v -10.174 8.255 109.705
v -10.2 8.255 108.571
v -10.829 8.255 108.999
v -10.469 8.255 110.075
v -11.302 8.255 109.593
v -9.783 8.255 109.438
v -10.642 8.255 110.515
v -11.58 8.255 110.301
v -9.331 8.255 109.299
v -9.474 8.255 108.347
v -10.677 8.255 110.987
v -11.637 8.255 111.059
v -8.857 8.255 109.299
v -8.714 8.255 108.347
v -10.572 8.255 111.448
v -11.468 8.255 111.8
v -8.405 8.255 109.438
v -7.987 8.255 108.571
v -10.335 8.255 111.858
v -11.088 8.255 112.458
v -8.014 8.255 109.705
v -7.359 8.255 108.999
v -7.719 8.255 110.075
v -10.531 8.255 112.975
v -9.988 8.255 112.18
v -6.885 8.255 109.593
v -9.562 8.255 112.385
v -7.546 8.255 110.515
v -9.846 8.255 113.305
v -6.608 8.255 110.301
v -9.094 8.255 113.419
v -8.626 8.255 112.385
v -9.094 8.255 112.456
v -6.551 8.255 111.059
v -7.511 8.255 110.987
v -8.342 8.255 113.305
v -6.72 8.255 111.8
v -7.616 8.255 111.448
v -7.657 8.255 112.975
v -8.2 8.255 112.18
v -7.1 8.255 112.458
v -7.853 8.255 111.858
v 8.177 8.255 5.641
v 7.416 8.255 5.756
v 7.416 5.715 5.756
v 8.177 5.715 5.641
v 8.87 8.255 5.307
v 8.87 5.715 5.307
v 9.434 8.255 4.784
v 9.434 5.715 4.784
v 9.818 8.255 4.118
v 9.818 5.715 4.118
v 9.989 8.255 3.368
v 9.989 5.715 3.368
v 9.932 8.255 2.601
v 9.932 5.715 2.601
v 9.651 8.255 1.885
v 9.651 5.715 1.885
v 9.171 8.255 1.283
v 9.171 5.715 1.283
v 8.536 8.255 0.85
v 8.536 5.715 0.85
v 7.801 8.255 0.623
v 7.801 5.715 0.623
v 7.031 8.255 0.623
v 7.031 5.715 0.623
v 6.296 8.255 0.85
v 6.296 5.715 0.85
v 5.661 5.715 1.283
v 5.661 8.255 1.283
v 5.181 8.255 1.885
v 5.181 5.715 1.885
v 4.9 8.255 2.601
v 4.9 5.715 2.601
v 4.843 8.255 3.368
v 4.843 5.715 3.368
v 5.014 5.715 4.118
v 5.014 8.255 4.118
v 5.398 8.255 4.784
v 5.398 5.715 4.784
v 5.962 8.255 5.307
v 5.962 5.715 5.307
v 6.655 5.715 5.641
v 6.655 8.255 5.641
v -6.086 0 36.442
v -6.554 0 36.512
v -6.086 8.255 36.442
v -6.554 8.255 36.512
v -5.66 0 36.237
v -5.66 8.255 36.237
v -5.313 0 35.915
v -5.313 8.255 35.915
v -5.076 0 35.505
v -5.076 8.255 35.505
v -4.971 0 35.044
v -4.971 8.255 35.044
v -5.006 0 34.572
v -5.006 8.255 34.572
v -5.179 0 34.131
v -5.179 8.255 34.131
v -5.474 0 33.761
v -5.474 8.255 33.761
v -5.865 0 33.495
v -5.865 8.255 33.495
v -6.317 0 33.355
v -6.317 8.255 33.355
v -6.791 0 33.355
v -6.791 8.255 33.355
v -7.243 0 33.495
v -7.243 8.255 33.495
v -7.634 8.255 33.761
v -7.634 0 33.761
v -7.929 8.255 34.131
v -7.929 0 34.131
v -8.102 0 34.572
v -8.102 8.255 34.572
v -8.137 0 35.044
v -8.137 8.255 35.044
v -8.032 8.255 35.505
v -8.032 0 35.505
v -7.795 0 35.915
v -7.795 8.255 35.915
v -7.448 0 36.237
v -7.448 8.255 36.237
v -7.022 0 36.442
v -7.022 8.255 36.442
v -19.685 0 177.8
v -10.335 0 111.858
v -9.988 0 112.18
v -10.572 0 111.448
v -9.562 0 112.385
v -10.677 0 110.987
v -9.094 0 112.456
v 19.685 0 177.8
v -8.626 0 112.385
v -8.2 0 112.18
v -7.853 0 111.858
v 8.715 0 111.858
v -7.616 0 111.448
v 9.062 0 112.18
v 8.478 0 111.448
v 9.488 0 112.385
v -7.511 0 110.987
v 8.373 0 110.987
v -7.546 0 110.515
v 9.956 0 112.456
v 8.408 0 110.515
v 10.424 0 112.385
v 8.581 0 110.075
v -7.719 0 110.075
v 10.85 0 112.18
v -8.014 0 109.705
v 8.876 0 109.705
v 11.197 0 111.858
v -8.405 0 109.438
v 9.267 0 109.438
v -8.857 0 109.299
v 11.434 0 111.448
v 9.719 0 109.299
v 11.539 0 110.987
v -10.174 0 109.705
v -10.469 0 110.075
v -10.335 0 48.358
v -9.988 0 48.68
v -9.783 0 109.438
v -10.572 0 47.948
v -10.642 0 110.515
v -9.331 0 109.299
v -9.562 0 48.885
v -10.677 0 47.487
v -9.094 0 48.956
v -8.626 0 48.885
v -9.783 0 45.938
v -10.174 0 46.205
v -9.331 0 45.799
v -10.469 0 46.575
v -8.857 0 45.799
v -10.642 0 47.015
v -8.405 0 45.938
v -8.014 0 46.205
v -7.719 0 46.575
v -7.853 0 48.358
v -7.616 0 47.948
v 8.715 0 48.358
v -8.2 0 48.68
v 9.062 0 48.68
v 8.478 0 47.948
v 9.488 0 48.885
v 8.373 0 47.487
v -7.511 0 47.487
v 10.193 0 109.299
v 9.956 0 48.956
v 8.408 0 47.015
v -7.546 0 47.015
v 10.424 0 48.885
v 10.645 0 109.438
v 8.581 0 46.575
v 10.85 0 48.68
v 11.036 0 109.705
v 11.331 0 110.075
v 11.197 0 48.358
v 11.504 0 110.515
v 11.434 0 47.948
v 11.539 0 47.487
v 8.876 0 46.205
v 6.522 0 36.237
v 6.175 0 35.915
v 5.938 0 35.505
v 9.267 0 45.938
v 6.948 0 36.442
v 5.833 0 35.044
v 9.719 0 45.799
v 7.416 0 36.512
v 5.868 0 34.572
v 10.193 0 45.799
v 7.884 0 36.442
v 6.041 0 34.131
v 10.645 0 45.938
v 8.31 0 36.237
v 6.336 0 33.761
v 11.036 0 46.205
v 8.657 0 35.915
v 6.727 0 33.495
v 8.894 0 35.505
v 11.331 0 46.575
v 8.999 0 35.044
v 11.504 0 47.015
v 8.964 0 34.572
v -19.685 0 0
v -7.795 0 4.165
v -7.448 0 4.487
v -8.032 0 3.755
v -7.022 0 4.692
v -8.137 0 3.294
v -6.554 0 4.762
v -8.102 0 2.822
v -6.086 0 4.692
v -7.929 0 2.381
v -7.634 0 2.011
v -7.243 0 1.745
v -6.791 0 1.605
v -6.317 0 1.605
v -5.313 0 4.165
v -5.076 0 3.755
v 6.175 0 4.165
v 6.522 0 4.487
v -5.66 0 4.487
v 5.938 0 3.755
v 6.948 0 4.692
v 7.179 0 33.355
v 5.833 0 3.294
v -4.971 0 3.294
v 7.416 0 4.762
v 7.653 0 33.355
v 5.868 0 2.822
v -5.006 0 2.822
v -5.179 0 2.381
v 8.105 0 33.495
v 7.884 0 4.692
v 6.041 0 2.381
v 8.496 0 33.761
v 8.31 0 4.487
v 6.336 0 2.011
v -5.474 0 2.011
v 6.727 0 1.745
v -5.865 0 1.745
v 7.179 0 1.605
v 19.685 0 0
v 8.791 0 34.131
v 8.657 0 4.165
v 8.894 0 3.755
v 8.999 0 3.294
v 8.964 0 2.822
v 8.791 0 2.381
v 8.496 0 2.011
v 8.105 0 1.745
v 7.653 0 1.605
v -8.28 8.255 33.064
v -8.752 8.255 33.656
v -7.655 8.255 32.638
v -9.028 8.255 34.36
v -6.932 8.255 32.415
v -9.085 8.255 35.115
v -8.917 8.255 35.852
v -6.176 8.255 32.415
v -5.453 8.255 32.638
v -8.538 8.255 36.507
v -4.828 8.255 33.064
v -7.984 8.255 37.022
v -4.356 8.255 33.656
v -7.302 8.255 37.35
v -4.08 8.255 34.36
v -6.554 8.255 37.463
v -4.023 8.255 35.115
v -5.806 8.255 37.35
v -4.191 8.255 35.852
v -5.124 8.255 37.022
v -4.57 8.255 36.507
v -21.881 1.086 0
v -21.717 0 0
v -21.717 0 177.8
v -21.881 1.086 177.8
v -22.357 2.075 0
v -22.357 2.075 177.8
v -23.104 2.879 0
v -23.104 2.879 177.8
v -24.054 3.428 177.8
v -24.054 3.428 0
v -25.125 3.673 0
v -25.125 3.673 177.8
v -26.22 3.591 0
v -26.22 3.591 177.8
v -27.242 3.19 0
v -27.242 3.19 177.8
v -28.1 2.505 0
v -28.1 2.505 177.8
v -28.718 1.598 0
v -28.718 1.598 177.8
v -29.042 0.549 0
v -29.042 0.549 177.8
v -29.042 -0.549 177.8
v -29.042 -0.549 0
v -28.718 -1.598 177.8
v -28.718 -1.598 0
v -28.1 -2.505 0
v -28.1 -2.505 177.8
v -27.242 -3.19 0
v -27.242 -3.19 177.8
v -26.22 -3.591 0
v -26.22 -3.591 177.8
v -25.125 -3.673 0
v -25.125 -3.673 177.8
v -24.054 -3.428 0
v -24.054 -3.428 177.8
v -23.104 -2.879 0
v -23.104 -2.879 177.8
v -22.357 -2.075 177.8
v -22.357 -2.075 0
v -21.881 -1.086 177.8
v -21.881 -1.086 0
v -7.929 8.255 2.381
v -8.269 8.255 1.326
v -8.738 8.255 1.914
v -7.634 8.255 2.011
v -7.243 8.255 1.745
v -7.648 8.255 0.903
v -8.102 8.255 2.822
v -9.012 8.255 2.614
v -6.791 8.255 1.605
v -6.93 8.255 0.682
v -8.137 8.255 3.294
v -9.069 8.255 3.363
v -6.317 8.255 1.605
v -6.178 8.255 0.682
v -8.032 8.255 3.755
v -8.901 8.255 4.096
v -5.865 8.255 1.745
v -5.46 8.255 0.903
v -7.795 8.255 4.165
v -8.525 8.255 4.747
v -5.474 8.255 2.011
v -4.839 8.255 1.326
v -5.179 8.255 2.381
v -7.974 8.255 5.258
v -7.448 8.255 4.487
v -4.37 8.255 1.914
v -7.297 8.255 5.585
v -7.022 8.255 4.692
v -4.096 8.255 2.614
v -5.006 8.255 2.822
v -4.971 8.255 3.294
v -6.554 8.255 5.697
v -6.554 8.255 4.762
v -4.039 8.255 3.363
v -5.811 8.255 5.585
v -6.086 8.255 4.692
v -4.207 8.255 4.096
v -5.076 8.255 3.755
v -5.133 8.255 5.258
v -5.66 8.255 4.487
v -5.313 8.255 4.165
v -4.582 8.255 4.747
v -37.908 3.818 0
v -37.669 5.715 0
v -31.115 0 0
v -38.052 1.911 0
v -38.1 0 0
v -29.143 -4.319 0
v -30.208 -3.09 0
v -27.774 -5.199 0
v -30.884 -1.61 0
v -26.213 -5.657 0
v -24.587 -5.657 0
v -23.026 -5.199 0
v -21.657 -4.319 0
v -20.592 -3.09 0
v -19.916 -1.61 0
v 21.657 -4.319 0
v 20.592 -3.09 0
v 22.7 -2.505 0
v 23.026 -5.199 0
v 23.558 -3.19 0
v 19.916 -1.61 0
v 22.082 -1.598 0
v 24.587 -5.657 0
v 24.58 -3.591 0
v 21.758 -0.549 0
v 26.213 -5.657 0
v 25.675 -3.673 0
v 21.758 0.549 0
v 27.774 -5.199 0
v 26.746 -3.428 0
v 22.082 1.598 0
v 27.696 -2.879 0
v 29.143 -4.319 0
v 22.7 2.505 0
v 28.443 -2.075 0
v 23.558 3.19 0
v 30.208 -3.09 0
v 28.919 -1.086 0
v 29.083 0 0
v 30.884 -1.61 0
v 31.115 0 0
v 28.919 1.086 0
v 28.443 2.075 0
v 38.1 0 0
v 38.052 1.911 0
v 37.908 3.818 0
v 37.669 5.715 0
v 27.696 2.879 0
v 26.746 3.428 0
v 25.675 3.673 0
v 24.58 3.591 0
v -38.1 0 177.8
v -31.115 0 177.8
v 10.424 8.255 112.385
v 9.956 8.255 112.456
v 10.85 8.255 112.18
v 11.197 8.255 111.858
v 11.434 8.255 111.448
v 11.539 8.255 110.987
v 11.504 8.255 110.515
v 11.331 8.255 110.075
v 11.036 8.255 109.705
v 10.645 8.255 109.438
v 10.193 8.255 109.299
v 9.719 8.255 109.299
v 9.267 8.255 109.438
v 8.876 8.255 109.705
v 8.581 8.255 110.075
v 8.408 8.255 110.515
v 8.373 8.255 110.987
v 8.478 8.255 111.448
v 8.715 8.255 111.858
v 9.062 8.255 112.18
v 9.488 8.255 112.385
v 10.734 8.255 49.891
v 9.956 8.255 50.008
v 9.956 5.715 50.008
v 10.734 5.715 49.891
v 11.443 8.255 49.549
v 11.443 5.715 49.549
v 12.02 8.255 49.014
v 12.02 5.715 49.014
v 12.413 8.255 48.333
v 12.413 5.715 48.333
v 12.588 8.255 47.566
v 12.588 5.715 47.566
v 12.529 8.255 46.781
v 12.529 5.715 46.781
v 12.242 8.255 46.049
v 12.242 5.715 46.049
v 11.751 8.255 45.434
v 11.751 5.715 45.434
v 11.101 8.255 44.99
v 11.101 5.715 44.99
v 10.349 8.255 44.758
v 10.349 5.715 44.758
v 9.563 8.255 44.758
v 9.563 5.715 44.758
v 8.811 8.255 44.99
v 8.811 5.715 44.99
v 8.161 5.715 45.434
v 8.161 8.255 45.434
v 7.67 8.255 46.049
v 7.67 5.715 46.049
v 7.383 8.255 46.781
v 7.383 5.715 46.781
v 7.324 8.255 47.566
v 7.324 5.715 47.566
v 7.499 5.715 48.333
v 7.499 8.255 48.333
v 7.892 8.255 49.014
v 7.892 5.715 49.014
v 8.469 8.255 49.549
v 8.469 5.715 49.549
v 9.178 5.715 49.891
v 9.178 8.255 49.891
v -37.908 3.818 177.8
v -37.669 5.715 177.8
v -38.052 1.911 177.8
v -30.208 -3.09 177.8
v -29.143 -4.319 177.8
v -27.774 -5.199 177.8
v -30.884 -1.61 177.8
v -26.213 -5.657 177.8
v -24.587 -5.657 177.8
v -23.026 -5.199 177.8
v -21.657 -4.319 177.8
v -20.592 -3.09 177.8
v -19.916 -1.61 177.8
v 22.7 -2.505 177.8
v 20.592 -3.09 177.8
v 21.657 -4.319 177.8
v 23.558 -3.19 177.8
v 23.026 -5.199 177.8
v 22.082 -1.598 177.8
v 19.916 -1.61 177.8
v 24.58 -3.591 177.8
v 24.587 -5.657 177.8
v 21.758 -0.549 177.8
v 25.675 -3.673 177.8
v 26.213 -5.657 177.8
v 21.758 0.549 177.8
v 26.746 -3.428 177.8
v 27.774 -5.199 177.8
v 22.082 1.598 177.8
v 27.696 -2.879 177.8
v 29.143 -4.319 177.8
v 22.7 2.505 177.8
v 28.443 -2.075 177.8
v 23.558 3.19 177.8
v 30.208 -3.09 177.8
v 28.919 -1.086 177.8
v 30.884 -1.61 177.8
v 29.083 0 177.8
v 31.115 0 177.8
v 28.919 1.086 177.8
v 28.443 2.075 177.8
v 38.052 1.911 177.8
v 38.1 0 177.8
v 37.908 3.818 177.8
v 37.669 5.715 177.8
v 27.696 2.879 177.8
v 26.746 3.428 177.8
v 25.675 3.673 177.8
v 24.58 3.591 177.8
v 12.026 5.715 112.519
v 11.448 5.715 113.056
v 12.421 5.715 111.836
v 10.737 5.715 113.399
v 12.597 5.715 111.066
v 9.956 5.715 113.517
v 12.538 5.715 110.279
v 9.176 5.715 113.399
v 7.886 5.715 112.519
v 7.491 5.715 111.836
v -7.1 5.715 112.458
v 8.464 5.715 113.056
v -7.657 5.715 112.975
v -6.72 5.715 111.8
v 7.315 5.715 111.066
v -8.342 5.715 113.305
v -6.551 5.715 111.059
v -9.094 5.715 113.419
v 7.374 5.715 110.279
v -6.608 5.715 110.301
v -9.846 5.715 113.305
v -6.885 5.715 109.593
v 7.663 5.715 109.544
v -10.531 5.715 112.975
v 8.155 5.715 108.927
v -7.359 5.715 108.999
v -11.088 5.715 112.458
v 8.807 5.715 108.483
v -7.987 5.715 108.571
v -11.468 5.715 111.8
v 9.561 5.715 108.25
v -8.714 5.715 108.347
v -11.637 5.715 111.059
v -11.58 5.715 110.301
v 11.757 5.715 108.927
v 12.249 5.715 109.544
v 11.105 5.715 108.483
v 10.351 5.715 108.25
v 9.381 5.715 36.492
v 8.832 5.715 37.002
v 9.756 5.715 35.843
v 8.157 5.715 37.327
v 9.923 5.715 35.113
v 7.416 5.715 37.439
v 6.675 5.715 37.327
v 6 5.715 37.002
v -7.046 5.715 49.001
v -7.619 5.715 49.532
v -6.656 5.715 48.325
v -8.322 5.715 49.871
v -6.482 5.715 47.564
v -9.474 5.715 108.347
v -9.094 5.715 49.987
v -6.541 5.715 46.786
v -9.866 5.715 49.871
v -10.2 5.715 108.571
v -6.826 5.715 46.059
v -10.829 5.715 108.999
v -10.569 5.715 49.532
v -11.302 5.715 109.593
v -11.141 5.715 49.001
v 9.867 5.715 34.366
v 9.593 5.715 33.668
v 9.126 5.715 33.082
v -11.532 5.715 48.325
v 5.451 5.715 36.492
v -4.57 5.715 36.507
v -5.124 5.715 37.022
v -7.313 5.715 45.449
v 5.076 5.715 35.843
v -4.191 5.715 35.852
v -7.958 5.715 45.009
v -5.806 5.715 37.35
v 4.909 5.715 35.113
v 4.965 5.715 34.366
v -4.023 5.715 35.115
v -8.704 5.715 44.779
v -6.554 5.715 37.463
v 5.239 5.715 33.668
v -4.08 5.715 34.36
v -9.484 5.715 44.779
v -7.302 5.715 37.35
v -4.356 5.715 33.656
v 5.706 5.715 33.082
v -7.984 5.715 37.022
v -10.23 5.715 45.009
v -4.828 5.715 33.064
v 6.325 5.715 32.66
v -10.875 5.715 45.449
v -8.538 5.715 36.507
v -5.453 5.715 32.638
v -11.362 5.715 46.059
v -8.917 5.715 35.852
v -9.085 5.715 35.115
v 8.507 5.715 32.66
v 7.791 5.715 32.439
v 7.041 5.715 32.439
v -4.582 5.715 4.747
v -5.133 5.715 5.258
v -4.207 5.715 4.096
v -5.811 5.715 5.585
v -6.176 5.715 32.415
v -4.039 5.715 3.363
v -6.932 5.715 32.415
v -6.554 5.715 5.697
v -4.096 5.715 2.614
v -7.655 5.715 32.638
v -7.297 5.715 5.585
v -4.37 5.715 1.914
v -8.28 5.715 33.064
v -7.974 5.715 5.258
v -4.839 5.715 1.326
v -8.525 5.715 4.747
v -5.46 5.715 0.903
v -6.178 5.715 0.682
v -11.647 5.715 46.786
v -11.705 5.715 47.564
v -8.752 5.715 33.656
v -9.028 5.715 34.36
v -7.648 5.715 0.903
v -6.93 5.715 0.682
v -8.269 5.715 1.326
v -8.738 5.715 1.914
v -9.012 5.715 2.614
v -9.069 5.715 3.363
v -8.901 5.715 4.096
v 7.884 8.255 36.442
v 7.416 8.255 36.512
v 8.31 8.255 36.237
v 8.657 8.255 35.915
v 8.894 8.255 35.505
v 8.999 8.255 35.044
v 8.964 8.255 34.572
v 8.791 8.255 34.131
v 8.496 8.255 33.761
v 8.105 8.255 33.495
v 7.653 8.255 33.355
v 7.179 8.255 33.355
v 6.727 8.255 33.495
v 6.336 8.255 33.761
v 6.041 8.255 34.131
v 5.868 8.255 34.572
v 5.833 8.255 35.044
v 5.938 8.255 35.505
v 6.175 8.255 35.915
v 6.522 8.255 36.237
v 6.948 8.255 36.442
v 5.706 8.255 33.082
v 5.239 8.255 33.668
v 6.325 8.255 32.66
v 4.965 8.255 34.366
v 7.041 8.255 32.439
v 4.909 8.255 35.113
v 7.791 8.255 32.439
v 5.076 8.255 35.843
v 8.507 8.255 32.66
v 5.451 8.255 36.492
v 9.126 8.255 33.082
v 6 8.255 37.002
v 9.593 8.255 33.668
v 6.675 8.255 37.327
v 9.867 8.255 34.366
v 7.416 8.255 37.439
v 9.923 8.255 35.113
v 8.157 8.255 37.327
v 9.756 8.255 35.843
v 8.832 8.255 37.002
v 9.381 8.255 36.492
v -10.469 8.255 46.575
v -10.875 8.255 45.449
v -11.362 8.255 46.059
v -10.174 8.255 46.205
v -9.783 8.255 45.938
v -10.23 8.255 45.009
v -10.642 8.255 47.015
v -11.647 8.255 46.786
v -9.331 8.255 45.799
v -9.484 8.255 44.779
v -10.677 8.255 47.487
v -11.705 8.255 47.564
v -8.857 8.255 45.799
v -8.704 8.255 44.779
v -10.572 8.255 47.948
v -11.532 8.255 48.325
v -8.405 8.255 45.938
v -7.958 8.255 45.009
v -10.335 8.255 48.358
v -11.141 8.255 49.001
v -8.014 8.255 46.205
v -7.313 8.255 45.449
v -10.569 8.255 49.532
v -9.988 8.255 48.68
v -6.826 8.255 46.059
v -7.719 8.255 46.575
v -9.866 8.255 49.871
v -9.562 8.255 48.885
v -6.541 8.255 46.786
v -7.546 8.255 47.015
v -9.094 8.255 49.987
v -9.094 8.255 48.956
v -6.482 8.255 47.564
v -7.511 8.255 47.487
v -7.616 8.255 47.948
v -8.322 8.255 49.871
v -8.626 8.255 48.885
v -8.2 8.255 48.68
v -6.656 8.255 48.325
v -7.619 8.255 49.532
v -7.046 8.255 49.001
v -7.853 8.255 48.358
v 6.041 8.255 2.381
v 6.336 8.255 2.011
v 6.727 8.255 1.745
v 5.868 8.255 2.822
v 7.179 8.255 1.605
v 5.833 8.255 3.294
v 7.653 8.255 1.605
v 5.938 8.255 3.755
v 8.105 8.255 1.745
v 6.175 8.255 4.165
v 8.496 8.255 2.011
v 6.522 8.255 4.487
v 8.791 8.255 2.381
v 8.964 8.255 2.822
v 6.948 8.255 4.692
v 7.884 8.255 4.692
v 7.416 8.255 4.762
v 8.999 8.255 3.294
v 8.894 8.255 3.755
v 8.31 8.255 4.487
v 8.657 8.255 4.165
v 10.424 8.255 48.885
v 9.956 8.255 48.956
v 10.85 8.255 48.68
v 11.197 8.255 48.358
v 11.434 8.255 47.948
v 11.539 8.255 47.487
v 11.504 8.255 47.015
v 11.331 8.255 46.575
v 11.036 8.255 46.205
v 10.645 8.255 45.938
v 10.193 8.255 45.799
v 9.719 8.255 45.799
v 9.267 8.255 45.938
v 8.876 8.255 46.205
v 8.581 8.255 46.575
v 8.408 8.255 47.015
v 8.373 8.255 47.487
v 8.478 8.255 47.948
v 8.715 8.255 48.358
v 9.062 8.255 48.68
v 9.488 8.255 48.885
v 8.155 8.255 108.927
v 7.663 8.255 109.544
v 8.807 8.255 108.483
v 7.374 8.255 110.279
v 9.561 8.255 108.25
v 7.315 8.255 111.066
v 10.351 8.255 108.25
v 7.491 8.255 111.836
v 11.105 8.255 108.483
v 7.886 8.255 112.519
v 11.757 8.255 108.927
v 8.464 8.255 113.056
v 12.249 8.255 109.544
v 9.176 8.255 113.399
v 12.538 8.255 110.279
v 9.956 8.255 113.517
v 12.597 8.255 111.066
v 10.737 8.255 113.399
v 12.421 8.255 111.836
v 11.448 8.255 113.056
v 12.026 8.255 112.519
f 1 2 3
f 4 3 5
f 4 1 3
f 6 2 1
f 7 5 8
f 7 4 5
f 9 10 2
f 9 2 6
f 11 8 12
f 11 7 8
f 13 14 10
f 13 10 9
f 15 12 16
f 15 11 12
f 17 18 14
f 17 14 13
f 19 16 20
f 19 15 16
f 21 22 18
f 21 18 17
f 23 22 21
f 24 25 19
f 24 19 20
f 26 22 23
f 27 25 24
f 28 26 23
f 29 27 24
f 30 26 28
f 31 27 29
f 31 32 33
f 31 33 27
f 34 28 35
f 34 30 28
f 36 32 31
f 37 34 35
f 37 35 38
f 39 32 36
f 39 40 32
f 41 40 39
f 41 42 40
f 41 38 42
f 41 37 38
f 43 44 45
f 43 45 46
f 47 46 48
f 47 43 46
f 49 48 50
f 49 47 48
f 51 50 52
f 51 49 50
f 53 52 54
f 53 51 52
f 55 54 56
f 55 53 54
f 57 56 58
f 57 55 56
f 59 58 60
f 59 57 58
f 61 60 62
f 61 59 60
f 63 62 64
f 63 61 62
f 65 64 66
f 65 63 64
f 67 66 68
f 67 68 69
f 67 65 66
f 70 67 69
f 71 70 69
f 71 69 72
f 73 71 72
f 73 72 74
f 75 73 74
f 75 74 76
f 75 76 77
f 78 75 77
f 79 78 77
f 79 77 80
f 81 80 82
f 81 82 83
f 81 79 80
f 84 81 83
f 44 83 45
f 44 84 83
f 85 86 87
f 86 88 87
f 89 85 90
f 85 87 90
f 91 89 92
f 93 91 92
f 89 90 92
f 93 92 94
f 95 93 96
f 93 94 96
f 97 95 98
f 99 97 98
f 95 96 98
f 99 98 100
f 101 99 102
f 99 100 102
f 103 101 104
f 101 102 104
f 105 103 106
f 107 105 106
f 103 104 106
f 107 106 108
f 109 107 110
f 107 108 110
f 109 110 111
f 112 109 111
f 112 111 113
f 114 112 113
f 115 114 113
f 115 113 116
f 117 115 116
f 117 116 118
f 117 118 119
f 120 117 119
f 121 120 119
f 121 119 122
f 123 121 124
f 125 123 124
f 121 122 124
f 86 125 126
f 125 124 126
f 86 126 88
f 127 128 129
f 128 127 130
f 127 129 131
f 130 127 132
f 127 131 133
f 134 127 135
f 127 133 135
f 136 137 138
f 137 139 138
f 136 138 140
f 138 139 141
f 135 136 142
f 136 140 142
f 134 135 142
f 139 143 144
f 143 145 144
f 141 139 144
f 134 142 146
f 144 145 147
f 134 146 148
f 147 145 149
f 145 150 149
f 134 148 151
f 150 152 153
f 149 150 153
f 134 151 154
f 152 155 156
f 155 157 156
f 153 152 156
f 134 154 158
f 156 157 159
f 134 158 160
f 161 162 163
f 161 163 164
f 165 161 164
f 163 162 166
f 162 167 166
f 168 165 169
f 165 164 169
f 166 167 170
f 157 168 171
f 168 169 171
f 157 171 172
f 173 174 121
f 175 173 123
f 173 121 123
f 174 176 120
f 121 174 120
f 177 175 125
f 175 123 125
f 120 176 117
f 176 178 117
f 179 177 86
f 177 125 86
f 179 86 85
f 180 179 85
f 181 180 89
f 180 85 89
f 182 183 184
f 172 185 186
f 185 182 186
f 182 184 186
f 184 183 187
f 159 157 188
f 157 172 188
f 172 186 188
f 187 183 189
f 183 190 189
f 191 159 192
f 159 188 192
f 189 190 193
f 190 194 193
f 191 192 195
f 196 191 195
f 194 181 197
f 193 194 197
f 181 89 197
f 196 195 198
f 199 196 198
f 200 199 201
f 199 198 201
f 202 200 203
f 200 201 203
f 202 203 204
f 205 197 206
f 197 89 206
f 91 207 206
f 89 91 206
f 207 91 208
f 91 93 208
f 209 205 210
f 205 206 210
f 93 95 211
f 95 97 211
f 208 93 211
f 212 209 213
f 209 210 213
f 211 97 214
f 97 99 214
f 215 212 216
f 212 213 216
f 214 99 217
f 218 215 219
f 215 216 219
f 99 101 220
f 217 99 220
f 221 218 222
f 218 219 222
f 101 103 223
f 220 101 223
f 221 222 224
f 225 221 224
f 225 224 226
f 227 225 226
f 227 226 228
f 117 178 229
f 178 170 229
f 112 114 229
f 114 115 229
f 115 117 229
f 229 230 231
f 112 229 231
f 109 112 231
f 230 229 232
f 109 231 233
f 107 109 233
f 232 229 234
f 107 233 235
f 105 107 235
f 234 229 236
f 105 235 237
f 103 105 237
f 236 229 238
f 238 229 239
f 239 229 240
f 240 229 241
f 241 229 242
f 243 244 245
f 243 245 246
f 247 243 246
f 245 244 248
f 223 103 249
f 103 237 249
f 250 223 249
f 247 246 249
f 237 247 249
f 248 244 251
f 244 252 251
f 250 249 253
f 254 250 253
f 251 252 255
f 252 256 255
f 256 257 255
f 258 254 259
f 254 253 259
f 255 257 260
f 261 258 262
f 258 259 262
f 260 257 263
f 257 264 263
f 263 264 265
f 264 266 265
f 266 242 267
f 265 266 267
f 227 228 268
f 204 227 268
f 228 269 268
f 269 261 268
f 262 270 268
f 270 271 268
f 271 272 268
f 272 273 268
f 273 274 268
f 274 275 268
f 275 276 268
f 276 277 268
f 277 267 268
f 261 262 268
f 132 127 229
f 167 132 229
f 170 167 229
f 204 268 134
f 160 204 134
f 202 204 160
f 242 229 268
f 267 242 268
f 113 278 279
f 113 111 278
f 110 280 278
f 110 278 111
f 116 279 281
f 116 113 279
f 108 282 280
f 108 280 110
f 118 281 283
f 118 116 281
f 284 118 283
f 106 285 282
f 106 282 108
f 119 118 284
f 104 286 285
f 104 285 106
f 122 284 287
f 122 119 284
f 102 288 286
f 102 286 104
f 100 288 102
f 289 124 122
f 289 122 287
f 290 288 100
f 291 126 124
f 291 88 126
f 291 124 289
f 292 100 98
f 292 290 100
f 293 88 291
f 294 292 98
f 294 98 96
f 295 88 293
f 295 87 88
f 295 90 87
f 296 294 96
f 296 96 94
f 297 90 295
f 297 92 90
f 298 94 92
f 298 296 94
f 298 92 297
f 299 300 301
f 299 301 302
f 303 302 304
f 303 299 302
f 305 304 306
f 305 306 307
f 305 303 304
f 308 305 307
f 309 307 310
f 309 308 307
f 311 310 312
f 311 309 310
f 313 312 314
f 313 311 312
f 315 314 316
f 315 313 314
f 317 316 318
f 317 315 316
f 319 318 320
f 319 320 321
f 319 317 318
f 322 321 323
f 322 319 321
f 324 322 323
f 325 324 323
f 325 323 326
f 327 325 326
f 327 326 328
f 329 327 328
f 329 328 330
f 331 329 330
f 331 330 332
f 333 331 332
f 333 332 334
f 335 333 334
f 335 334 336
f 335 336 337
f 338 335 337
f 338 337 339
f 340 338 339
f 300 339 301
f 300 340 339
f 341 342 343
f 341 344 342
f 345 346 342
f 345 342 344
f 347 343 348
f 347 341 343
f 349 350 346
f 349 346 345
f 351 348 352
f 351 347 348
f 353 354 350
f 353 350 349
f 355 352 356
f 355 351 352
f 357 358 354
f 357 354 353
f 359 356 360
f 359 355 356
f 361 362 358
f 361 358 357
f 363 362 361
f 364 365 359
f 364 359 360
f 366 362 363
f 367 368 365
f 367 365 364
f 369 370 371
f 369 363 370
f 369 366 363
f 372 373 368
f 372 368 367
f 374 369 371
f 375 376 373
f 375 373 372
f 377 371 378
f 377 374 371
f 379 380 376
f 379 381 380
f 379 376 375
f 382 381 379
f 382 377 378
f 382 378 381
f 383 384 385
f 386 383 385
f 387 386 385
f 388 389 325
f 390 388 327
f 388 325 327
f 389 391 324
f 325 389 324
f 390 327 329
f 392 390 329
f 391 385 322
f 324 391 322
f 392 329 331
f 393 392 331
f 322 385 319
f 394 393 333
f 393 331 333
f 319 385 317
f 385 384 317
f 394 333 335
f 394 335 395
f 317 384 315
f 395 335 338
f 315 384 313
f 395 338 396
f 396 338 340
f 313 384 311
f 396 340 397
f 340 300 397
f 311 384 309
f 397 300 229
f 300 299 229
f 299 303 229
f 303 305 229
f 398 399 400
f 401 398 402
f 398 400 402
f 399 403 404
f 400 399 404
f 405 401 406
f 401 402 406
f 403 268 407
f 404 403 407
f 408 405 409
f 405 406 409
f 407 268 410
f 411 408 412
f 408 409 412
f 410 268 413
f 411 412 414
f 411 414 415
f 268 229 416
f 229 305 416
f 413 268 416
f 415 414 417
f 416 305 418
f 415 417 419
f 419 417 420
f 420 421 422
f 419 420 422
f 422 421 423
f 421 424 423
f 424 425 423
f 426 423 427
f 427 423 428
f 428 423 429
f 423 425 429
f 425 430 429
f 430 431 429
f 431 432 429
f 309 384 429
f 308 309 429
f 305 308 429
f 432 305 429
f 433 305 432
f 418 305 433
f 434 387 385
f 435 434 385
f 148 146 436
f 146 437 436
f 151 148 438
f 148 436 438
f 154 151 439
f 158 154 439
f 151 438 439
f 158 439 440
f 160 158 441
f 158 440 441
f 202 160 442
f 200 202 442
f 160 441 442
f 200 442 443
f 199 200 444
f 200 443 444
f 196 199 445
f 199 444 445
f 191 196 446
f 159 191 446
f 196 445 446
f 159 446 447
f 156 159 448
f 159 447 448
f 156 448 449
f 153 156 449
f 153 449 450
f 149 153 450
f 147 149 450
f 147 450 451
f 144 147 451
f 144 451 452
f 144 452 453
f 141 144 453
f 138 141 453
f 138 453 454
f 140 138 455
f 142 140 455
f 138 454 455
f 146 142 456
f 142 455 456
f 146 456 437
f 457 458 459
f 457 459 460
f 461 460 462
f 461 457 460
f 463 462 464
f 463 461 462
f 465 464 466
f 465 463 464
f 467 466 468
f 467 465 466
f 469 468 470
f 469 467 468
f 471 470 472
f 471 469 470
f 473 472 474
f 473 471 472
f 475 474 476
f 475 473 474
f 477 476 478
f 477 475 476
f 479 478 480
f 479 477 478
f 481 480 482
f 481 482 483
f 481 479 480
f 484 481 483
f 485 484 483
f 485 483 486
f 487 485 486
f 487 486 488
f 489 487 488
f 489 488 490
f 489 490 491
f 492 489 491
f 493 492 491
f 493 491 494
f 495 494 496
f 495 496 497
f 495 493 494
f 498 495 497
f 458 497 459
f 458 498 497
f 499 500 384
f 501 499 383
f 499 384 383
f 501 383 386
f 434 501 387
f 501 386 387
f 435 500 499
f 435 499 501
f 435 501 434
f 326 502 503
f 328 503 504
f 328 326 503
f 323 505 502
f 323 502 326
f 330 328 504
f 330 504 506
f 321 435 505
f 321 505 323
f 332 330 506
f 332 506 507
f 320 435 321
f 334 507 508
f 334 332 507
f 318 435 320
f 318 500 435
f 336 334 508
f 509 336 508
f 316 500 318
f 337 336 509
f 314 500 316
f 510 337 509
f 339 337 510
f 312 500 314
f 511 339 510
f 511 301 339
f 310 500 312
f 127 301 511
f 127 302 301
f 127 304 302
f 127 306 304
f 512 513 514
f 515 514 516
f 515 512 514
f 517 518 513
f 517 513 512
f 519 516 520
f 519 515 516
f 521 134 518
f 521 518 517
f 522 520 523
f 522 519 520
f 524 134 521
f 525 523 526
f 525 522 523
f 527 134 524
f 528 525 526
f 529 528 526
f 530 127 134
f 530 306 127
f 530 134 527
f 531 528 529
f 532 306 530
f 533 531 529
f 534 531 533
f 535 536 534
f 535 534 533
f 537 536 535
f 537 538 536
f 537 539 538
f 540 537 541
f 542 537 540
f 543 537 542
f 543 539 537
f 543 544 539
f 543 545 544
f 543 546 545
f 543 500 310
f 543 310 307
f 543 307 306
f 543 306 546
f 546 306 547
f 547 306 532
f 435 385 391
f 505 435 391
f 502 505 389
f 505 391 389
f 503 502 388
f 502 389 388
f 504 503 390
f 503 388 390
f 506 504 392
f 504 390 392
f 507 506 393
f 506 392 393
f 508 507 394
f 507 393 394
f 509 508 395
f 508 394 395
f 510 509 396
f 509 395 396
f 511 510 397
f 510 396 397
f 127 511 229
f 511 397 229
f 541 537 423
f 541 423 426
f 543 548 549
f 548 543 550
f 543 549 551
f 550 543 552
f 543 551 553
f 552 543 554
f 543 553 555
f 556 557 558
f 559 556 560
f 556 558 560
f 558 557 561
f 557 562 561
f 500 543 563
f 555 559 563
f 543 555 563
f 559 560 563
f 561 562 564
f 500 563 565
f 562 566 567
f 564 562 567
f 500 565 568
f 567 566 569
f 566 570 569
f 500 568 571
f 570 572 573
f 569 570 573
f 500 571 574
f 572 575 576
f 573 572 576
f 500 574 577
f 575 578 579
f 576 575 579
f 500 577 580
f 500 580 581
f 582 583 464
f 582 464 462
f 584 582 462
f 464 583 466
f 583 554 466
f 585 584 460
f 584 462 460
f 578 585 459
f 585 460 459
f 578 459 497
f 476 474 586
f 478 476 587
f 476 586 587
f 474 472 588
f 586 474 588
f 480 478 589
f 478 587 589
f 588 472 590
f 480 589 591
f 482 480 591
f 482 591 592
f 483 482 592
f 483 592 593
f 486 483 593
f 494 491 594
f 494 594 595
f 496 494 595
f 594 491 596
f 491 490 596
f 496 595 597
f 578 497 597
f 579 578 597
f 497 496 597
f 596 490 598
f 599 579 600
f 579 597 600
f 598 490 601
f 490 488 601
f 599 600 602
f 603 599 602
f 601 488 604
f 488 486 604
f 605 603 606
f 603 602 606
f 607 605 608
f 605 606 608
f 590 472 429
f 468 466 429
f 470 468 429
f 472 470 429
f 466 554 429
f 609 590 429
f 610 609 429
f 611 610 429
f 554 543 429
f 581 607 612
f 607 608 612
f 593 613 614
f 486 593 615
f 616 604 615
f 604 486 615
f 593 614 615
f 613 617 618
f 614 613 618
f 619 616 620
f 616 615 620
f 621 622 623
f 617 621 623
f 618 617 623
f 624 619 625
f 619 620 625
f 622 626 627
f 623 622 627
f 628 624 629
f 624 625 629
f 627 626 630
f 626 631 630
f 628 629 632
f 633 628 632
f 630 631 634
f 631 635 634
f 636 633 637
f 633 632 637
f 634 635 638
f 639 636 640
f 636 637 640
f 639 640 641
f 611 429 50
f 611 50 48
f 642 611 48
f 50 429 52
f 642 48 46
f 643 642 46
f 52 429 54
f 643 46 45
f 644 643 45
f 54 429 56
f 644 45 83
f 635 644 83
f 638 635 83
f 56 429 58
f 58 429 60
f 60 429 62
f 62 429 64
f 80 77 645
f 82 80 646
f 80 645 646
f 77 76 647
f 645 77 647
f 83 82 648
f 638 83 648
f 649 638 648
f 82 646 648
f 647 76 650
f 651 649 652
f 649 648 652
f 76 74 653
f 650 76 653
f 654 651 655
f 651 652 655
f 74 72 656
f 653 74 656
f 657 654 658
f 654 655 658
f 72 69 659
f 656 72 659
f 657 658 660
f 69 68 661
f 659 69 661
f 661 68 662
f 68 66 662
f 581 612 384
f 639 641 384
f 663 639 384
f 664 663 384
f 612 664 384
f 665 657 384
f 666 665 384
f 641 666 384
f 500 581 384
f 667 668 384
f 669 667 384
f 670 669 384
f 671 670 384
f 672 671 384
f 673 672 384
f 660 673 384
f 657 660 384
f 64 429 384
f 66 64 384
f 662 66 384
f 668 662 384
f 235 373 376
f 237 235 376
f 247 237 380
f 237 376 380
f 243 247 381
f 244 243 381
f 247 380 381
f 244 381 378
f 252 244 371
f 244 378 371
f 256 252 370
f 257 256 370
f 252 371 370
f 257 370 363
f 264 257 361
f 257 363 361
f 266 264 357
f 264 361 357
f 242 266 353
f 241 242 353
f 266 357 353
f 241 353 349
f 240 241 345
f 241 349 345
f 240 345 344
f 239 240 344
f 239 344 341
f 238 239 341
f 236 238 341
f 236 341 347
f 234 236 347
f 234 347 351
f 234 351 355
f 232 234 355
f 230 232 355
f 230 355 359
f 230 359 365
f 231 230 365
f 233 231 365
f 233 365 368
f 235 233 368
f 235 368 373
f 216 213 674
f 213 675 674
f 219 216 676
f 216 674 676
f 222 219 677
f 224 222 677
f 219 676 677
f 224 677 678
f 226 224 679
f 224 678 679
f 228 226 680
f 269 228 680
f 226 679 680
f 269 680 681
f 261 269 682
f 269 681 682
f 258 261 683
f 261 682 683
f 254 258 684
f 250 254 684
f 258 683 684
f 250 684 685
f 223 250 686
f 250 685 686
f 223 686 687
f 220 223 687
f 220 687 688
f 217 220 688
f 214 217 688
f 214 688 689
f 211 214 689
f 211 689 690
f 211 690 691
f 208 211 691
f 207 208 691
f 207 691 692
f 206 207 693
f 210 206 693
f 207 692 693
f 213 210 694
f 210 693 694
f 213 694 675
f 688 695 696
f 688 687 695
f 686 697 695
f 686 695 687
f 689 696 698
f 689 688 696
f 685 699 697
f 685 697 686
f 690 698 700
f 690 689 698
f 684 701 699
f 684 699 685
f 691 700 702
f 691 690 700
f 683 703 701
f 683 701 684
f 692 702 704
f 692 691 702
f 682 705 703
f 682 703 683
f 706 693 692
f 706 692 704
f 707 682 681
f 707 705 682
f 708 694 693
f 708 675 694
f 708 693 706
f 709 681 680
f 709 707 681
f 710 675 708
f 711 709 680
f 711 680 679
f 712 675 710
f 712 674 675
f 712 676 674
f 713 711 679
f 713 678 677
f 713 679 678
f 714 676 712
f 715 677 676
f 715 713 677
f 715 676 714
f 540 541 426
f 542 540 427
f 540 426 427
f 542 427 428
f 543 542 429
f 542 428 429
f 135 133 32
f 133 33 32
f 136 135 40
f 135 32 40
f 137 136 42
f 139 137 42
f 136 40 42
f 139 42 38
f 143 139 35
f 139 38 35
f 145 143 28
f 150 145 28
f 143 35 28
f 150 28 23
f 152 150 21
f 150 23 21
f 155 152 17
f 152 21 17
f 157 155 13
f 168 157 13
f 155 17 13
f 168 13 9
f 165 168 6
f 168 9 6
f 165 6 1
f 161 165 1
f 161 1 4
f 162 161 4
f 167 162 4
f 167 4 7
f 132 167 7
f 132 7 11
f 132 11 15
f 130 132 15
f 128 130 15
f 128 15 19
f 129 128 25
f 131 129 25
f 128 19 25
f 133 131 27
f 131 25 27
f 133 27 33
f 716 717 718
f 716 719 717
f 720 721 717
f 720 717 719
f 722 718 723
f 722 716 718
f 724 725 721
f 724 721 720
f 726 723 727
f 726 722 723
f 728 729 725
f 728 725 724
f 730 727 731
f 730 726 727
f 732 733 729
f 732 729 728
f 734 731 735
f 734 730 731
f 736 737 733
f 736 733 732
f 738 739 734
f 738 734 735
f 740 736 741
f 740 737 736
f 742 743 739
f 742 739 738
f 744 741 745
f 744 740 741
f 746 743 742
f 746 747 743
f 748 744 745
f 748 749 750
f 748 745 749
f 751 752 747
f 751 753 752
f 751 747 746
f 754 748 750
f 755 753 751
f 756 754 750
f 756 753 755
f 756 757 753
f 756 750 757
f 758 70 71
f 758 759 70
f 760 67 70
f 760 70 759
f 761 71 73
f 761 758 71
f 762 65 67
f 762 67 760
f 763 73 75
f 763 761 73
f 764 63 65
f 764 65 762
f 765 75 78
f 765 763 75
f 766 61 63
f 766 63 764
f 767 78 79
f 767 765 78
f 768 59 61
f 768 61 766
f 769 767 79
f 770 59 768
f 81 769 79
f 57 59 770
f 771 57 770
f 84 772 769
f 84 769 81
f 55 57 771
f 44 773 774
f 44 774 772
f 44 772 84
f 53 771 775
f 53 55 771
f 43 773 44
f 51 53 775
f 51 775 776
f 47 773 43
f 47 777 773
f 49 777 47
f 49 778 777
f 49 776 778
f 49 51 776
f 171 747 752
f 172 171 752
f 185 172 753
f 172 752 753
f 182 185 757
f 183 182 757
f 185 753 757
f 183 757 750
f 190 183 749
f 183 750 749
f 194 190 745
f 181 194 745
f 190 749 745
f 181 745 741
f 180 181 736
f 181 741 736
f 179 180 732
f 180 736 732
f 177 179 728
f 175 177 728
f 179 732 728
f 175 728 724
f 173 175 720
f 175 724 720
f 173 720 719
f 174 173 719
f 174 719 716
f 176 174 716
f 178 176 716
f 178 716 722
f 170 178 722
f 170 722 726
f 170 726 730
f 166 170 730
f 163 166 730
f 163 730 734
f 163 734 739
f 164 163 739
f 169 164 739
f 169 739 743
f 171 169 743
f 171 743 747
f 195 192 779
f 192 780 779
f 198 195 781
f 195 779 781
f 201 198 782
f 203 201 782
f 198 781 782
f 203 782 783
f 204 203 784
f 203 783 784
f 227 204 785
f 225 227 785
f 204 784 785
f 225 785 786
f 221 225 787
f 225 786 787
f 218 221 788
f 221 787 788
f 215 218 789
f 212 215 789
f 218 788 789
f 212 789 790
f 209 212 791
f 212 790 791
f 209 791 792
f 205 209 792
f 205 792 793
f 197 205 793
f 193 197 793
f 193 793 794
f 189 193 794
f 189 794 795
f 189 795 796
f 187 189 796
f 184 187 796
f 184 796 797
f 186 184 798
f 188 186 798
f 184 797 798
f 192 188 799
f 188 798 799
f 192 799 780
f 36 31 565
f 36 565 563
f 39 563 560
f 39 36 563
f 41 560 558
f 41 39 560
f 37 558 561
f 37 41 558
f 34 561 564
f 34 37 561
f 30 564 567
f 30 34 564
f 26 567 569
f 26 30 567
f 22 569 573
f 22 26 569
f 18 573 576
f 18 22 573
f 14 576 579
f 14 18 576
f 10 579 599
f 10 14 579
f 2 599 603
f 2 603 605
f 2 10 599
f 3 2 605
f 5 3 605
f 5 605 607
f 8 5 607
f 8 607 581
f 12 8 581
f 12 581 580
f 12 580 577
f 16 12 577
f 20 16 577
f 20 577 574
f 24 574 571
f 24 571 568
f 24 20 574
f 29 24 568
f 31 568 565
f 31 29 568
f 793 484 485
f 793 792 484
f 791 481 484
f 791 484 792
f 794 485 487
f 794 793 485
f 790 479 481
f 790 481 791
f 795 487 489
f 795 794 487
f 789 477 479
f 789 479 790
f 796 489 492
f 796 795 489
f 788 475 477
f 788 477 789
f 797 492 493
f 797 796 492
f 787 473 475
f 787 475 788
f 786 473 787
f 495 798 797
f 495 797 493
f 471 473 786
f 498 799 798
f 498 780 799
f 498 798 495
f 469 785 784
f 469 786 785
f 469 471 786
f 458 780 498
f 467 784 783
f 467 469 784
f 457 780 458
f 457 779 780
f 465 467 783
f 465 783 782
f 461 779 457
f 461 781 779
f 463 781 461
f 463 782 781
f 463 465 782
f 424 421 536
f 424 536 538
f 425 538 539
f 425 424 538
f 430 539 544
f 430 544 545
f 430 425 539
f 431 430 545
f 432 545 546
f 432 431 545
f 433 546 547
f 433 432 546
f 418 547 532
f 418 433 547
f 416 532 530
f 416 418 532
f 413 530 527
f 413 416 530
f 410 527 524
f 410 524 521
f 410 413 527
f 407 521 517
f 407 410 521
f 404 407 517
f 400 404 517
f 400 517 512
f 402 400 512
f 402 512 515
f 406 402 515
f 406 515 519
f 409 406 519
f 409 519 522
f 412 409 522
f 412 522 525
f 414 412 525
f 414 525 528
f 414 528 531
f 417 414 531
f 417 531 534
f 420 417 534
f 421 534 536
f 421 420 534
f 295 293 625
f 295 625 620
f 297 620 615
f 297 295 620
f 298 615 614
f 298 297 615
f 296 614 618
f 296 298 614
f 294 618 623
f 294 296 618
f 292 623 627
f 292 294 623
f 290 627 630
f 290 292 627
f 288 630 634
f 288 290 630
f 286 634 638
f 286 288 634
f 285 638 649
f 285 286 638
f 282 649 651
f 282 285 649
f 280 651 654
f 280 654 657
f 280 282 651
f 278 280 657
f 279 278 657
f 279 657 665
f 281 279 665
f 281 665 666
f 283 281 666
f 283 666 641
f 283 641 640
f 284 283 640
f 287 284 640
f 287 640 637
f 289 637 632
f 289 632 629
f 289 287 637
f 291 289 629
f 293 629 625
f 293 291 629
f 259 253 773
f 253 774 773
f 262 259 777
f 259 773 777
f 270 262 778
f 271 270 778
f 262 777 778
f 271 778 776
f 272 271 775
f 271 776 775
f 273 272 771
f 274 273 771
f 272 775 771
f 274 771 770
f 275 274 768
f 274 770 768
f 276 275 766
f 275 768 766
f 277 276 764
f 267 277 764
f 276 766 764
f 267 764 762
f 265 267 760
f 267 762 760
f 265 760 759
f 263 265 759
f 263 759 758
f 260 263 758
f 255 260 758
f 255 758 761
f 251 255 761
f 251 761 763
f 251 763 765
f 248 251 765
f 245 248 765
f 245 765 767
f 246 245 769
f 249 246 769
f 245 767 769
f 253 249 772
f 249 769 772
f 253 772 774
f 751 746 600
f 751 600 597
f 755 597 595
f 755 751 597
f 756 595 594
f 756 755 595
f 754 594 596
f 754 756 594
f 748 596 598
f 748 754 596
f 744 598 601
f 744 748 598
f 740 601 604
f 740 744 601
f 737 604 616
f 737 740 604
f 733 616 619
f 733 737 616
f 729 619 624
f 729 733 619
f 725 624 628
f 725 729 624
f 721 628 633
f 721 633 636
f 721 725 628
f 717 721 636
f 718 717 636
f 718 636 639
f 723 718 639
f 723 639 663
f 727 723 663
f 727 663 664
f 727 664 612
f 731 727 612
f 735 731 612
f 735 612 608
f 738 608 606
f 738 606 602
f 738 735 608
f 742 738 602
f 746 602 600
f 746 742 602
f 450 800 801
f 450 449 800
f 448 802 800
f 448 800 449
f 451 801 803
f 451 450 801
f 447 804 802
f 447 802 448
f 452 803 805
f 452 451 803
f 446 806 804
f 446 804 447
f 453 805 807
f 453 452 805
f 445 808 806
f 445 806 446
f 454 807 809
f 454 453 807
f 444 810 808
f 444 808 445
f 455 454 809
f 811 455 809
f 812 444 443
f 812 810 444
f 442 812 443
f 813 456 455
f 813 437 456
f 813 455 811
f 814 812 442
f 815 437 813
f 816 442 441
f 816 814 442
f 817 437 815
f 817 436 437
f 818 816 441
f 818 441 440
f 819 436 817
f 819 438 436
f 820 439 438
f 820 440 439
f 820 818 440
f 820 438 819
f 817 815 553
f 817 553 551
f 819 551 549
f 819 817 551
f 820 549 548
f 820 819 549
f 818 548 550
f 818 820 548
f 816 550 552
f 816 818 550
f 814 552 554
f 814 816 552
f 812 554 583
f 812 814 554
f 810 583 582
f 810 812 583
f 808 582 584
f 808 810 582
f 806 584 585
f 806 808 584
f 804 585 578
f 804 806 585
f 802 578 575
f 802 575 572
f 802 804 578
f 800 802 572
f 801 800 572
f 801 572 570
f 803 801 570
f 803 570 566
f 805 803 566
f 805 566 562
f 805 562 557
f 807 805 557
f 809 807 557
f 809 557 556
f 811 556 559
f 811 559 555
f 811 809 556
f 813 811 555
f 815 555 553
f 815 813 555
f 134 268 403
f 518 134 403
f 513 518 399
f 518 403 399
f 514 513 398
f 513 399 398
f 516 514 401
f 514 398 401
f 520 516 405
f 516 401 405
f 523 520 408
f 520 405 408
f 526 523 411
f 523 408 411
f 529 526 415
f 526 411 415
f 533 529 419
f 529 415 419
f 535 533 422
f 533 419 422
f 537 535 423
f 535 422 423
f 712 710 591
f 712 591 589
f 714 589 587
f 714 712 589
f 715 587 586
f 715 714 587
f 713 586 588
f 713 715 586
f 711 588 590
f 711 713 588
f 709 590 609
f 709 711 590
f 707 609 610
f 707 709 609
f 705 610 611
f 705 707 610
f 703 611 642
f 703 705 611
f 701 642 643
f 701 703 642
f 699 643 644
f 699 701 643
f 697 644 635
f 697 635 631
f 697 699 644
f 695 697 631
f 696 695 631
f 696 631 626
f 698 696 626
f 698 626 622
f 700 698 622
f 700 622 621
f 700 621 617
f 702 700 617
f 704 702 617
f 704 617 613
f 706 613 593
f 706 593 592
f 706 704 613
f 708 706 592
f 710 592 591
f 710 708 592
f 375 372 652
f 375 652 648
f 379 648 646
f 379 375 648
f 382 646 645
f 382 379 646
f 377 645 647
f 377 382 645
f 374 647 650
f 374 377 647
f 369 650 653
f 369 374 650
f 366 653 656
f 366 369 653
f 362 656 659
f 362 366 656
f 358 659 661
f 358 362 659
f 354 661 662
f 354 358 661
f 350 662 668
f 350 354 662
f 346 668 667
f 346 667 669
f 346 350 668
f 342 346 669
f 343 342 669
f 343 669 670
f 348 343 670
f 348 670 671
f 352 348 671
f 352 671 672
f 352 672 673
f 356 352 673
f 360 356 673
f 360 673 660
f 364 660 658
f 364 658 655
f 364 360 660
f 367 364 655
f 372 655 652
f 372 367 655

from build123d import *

# Parameters (mm, degrees)
SKETCH1_R           = 5.715
SKETCH1_R_2         = 3.683
BOSS_EXTRUDE2_DEPTH = 177.8
SKETCH2_R           = 1.5875
CUT_EXTRUDE1_DEPTH  = 183.195210969
BOSS_EXTRUDE4_START = 2.54
SKETCH3_R           = 2.521654131
SKETCH3_R_2         = 1.5875
SKETCH3_R_3         = 2.580622747
SKETCH3_R_4         = 2.513629008
SKETCH3_R_5         = 2.53806637
BOSS_EXTRUDE4_DEPTH = 2.54
SKETCH4_R           = 1.5875
CUT_EXTRUDE2_DEPTH  = 183.195210969
BOSS_EXTRUDE5_START = 2.54
SKETCH5_R           = 2.618871397
SKETCH5_R_2         = 1.5875
SKETCH5_R_3         = 2.639509757
SKETCH5_R_4         = 2.648115463
SKETCH5_R_5         = 2.550190152
BOSS_EXTRUDE5_DEPTH = 2.54


with BuildPart() as part:
    # Sketch1 → Boss-Extrude2 (new body)
    # profile 1 of 5: a face of its own
    with BuildSketch(Plane.XY):
        with BuildLine():
            Line((25.4, 5.715), (-25.4, 5.715))
            ThreePointArc((-25.4, 5.715), (-21.358884746, 4.041115254), (-19.685, 0))
            Line((-19.685, 0), (19.685, 0))
            ThreePointArc((19.685, 0), (21.358884746, 4.041115254), (25.4, 5.715))
        make_face()
    # profile 2 of 5: a face of its own
    with BuildSketch(Plane.XY):
        with Locations((-25.4, 0)):
            Circle(SKETCH1_R)
        with Locations((-25.4, 0)):
            Circle(SKETCH1_R_2, mode=Mode.SUBTRACT)
    # profile 3 of 5: a face of its own
    with BuildSketch(Plane.XY):
        with Locations((25.4, 0)):
            Circle(SKETCH1_R)
        with Locations((25.4, 0)):
            Circle(SKETCH1_R_2, mode=Mode.SUBTRACT)
    # profile 4 of 5: a face of its own
    with BuildSketch(Plane.XY):
        with BuildLine():
            ThreePointArc((-31.115, 0), (-29.441115254, 4.041115254), (-25.4, 5.715))
            Line((-25.4, 5.715), (-37.668936473, 5.715))
            ThreePointArc((-37.668936473, 5.715), (-37.992081278, 2.865616895), (-38.1, 0))
            Line((-38.1, 0), (-31.115, 0))
        make_face()
    # profile 5 of 5: a face of its own
    with BuildSketch(Plane.XY):
        with BuildLine():
            Line((37.668936473, 5.715), (25.4, 5.715))
            ThreePointArc((25.4, 5.715), (29.441115254, 4.041115254), (31.115, 0))
            Line((31.115, 0), (38.1, 0))
            ThreePointArc((38.1, 0), (37.992081278, 2.865616895), (37.668936473, 5.715))
        make_face()
    extrude(amount=BOSS_EXTRUDE2_DEPTH)

    # Sketch2 → Cut-Extrude1 (cut, through all)
    with BuildSketch(Plane(origin=(0, 5.715, 0), x_dir=(1, 0, 0), z_dir=(0, 1, 0))):
        with Locations(Location((-6.553936473, -3.175, 0), (0, 0, 270))):
            Circle(SKETCH2_R)
        with Locations(Location((7.416063527, -3.175, 0), (0, 0, 270))):
            Circle(SKETCH2_R)
        with Locations(Location((-6.553936473, -34.925, 0), (0, 0, 270))):
            Circle(SKETCH2_R)
        with Locations(Location((7.416063527, -34.925, 0), (0, 0, 270))):
            Circle(SKETCH2_R)
    extrude(amount=-CUT_EXTRUDE1_DEPTH, mode=Mode.SUBTRACT)

    # Sketch3 → Boss-Extrude4 (add)
    # profile 1 of 4: a face of its own
    with BuildSketch(Plane(origin=(0, 5.715, 0), x_dir=(1, 0, 0), z_dir=(0, 1, 0)).offset(BOSS_EXTRUDE4_START)):
        with Locations(Location((-6.553936473, -3.175, 0), (0, 0, 270))):
            Circle(SKETCH3_R)
        with Locations(Location((-6.553936473, -3.175, 0), (0, 0, 270))):
            Circle(SKETCH3_R_2, mode=Mode.SUBTRACT)
    # profile 2 of 4: a face of its own
    with BuildSketch(Plane(origin=(0, 5.715, 0), x_dir=(1, 0, 0), z_dir=(0, 1, 0)).offset(BOSS_EXTRUDE4_START)):
        with Locations(Location((7.416063527, -3.175, 0), (0, 0, 270))):
            Circle(SKETCH3_R_3)
        with Locations(Location((7.416063527, -3.175, 0), (0, 0, 270))):
            Circle(SKETCH3_R_2, mode=Mode.SUBTRACT)
    # profile 3 of 4: a face of its own
    with BuildSketch(Plane(origin=(0, 5.715, 0), x_dir=(1, 0, 0), z_dir=(0, 1, 0)).offset(BOSS_EXTRUDE4_START)):
        with Locations(Location((7.416063527, -34.925, 0), (0, 0, 270))):
            Circle(SKETCH3_R_4)
        with Locations(Location((7.416063527, -34.925, 0), (0, 0, 270))):
            Circle(SKETCH3_R_2, mode=Mode.SUBTRACT)
    # profile 4 of 4: a face of its own
    with BuildSketch(Plane(origin=(0, 5.715, 0), x_dir=(1, 0, 0), z_dir=(0, 1, 0)).offset(BOSS_EXTRUDE4_START)):
        with Locations(Location((-6.553936473, -34.925, 0), (0, 0, 270))):
            Circle(SKETCH3_R_5)
        with Locations(Location((-6.553936473, -34.925, 0), (0, 0, 270))):
            Circle(SKETCH3_R_2, mode=Mode.SUBTRACT)
    extrude(amount=-BOSS_EXTRUDE4_DEPTH)

    # Sketch4 → Cut-Extrude2 (cut, through all)
    with BuildSketch(Plane(origin=(0, 5.715, 0), x_dir=(1, 0, 0), z_dir=(0, 1, 0))):
        with Locations(Location((-9.093936473, -47.368407893, 0), (0, 0, 270))):
            Circle(SKETCH4_R)
        with Locations(Location((9.956063527, -47.368407893, 0), (0, 0, 270))):
            Circle(SKETCH4_R)
        with Locations(Location((9.956063527, -110.868407893, 0), (0, 0, 270))):
            Circle(SKETCH4_R)
        with Locations(Location((-9.093936473, -110.868407893, 0), (0, 0, 270))):
            Circle(SKETCH4_R)
    extrude(amount=-CUT_EXTRUDE2_DEPTH, mode=Mode.SUBTRACT)

    # Sketch5 → Boss-Extrude5 (add)
    # profile 1 of 4: a face of its own
    with BuildSketch(Plane(origin=(0, 5.715, 0), x_dir=(1, 0, 0), z_dir=(0, 1, 0)).offset(BOSS_EXTRUDE5_START)):
        with Locations(Location((-9.093936473, -47.368407893, 0), (0, 0, 270))):
            Circle(SKETCH5_R)
        with Locations(Location((-9.093936473, -47.368407893, 0), (0, 0, 270))):
            Circle(SKETCH5_R_2, mode=Mode.SUBTRACT)
    # profile 2 of 4: a face of its own
    with BuildSketch(Plane(origin=(0, 5.715, 0), x_dir=(1, 0, 0), z_dir=(0, 1, 0)).offset(BOSS_EXTRUDE5_START)):
        with Locations(Location((9.956063527, -47.368407893, 0), (0, 0, 270))):
            Circle(SKETCH5_R_3)
        with Locations(Location((9.956063527, -47.368407893, 0), (0, 0, 270))):
            Circle(SKETCH5_R_2, mode=Mode.SUBTRACT)
    # profile 3 of 4: a face of its own
    with BuildSketch(Plane(origin=(0, 5.715, 0), x_dir=(1, 0, 0), z_dir=(0, 1, 0)).offset(BOSS_EXTRUDE5_START)):
        with Locations(Location((9.956063527, -110.868407893, 0), (0, 0, 270))):
            Circle(SKETCH5_R_4)
        with Locations(Location((9.956063527, -110.868407893, 0), (0, 0, 270))):
            Circle(SKETCH5_R_2, mode=Mode.SUBTRACT)
    # profile 4 of 4: a face of its own
    with BuildSketch(Plane(origin=(0, 5.715, 0), x_dir=(1, 0, 0), z_dir=(0, 1, 0)).offset(BOSS_EXTRUDE5_START)):
        with Locations(Location((-9.093936473, -110.868407893, 0), (0, 0, 270))):
            Circle(SKETCH5_R_5)
        with Locations(Location((-9.093936473, -110.868407893, 0), (0, 0, 270))):
            Circle(SKETCH5_R_2, mode=Mode.SUBTRACT)
    extrude(amount=-BOSS_EXTRUDE5_DEPTH)


solid = part.part
